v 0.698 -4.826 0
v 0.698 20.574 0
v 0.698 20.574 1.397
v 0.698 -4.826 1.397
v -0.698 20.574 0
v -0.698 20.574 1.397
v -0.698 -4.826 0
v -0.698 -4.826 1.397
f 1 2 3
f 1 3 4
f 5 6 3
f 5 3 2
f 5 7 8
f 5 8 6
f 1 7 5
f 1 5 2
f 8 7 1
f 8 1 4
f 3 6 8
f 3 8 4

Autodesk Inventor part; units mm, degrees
ref_plane "YZ Plane" through (0, 0, 0) normal (1, 0, 0) x (0, 1, 0)
ref_plane "XZ Plane" through (0, 0, 0) normal (0, 1, 0) x (-1, 0, 0)
ref_plane "XY Plane" through (0, 0, 0) normal (0, 0, 1) x (1, 0, 0)
sketch "Sketch1" plane through (0, 0, 0) normal (0, 0, 1) x (1, 0, 0)
  line L0 (-0.6985, 30.861) -> (0.6985, 30.861)
  line L1 (0.6985, 30.861) -> (0.6985, -30.861)
  line L2 (0.6985, -30.861) -> (-0.6985, -30.861)
  line L3 (-0.6985, -30.861) -> (-0.6985, 30.861)
  line L4 (-0.6985, 30.861) -> (0.6985, -30.861) construction
  line L5 (0.6985, 30.861) -> (-0.6985, -30.861) construction
  point P0 (0, 0)
  dimension "d0" = 1.397
  dimension "d1" = 61.722
extrude "Extrusion1" add sketch "Sketch1" along normal blind 1.397
sketch "Sketch3" plane through (0.6985, -30.861, 0) normal (1, 0, 0) x (0, 0, -1)
  line L0 (0, 61.722) -> (0, 0) projected
  line L1 (0, 61.722) -> (-1.397, 61.722) projected
  line L2 (-1.397, 0) -> (-1.397, 61.722) projected
  line L3 (0, 0) -> (-1.397, 0) projected
  line L4 (-1.397, 0) -> (-1.905, 0)
  line L5 (-1.397, 0) -> (-1.397, 1.27)
  line L6 (-1.397, 53.34) -> (-1.397, 0) projected
  line L7 (-1.651, 1.27) -> (-1.397, 1.27)
  line L8 (-1.651, 1.27) -> (-1.905, 0)
  point P0 (0, 30.861)
  dimension "d8" = 0.508
  dimension "d9" = 1.27
  dimension "d10" = 0.254
ref_plane "Work Plane2" through (-0.6985, -30.226, 0) normal (0, -1, 0) x (1, 0, 0)
sketch "Sketch7" plane through (-0.6985, -30.226, 0) normal (0, -1, 0) x (1, 0, 0)
  line L0 (1.3985, 1.651) -> (-0.254, 1.651)
  line L1 (-0.254, 1.651) -> (-0.254, 0)
  line L2 (0, 0) -> (0, 1.397) projected
  line L3 (0, 1.397) -> (1.397, 1.397) projected
  point P0 (0.6985, 0)
  dimension "d20" = 0.254
  dimension "d21" = 0.254
sweep "Sweep2" add profiles "Sketch3" path "Sketch7" path curves L0 L1 contours L4 L8 L7 L2
ref_plane "Work Plane4" through (-0.6985, 20.574, 0) normal (0, -1, 0) x (1, 0, 0)
ref_plane "Work Plane3" through (-0.6985, -4.826, 0) normal (0, -1, 0) x (1, 0, 0)
split "Split1" plane through (-0.6985, -4.826, 0) removes the side toward (0, -1, 0)
split "Split2" plane through (-0.6985, 20.574, 0) removes the side toward (0, 1, 0)
properties part number "corner"
